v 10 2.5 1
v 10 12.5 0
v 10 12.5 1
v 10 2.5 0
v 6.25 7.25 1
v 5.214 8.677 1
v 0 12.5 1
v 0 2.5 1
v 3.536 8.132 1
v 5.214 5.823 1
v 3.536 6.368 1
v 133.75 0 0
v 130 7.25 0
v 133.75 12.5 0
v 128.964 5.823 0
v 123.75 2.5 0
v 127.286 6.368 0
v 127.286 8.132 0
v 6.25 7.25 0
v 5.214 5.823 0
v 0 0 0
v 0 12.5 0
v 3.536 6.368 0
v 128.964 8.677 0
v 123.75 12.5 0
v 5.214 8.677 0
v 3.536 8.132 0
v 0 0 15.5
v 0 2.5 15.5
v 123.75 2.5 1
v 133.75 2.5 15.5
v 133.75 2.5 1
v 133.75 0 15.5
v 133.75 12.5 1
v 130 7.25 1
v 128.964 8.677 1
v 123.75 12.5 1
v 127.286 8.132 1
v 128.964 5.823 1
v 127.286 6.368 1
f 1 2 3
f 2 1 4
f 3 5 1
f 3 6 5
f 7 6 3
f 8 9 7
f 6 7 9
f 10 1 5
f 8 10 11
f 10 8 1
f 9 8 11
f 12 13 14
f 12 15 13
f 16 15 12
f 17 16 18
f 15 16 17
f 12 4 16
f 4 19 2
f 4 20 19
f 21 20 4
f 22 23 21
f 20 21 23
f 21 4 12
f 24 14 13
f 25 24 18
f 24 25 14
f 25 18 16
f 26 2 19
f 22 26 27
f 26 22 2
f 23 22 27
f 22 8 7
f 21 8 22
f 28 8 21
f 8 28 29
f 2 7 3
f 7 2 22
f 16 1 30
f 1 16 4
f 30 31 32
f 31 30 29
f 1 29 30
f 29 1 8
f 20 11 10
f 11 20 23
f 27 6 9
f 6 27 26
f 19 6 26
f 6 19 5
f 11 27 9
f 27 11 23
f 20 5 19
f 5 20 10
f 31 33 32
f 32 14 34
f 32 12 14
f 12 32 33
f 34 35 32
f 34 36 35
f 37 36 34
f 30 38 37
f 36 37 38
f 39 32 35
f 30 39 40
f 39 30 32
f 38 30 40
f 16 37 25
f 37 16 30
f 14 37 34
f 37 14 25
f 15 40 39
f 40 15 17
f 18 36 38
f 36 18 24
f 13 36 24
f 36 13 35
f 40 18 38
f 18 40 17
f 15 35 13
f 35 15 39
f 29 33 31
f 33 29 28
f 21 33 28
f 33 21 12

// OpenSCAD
// Create the closer facing of the two straight walls

// Define the wall itself
cube([133.75, 2.5, 15.5]);

// Define constants used for supports that will attach the case to the frame
raftSideLength = 10;
raftHeight = 1;
raftScrewHoleRadius = 1.5;
screwHoleOffset = 4.75;

// Create two rafts (one in at each end) that will be used to secure this part to the steel plate
translate([0,2.5,0]) {
    difference() {
        cube([raftSideLength,raftSideLength,raftHeight]);
        translate([screwHoleOffset,screwHoleOffset,0]) {
            cylinder(h=raftHeight, r=raftScrewHoleRadius);
        }
    }
}

translate([123.75,2.5,0]) {
    difference() {
        cube([raftSideLength,raftSideLength,raftHeight]);
        translate([screwHoleOffset,screwHoleOffset,0]) {
            cylinder(h=raftHeight, r=raftScrewHoleRadius);
        }
    }
}
